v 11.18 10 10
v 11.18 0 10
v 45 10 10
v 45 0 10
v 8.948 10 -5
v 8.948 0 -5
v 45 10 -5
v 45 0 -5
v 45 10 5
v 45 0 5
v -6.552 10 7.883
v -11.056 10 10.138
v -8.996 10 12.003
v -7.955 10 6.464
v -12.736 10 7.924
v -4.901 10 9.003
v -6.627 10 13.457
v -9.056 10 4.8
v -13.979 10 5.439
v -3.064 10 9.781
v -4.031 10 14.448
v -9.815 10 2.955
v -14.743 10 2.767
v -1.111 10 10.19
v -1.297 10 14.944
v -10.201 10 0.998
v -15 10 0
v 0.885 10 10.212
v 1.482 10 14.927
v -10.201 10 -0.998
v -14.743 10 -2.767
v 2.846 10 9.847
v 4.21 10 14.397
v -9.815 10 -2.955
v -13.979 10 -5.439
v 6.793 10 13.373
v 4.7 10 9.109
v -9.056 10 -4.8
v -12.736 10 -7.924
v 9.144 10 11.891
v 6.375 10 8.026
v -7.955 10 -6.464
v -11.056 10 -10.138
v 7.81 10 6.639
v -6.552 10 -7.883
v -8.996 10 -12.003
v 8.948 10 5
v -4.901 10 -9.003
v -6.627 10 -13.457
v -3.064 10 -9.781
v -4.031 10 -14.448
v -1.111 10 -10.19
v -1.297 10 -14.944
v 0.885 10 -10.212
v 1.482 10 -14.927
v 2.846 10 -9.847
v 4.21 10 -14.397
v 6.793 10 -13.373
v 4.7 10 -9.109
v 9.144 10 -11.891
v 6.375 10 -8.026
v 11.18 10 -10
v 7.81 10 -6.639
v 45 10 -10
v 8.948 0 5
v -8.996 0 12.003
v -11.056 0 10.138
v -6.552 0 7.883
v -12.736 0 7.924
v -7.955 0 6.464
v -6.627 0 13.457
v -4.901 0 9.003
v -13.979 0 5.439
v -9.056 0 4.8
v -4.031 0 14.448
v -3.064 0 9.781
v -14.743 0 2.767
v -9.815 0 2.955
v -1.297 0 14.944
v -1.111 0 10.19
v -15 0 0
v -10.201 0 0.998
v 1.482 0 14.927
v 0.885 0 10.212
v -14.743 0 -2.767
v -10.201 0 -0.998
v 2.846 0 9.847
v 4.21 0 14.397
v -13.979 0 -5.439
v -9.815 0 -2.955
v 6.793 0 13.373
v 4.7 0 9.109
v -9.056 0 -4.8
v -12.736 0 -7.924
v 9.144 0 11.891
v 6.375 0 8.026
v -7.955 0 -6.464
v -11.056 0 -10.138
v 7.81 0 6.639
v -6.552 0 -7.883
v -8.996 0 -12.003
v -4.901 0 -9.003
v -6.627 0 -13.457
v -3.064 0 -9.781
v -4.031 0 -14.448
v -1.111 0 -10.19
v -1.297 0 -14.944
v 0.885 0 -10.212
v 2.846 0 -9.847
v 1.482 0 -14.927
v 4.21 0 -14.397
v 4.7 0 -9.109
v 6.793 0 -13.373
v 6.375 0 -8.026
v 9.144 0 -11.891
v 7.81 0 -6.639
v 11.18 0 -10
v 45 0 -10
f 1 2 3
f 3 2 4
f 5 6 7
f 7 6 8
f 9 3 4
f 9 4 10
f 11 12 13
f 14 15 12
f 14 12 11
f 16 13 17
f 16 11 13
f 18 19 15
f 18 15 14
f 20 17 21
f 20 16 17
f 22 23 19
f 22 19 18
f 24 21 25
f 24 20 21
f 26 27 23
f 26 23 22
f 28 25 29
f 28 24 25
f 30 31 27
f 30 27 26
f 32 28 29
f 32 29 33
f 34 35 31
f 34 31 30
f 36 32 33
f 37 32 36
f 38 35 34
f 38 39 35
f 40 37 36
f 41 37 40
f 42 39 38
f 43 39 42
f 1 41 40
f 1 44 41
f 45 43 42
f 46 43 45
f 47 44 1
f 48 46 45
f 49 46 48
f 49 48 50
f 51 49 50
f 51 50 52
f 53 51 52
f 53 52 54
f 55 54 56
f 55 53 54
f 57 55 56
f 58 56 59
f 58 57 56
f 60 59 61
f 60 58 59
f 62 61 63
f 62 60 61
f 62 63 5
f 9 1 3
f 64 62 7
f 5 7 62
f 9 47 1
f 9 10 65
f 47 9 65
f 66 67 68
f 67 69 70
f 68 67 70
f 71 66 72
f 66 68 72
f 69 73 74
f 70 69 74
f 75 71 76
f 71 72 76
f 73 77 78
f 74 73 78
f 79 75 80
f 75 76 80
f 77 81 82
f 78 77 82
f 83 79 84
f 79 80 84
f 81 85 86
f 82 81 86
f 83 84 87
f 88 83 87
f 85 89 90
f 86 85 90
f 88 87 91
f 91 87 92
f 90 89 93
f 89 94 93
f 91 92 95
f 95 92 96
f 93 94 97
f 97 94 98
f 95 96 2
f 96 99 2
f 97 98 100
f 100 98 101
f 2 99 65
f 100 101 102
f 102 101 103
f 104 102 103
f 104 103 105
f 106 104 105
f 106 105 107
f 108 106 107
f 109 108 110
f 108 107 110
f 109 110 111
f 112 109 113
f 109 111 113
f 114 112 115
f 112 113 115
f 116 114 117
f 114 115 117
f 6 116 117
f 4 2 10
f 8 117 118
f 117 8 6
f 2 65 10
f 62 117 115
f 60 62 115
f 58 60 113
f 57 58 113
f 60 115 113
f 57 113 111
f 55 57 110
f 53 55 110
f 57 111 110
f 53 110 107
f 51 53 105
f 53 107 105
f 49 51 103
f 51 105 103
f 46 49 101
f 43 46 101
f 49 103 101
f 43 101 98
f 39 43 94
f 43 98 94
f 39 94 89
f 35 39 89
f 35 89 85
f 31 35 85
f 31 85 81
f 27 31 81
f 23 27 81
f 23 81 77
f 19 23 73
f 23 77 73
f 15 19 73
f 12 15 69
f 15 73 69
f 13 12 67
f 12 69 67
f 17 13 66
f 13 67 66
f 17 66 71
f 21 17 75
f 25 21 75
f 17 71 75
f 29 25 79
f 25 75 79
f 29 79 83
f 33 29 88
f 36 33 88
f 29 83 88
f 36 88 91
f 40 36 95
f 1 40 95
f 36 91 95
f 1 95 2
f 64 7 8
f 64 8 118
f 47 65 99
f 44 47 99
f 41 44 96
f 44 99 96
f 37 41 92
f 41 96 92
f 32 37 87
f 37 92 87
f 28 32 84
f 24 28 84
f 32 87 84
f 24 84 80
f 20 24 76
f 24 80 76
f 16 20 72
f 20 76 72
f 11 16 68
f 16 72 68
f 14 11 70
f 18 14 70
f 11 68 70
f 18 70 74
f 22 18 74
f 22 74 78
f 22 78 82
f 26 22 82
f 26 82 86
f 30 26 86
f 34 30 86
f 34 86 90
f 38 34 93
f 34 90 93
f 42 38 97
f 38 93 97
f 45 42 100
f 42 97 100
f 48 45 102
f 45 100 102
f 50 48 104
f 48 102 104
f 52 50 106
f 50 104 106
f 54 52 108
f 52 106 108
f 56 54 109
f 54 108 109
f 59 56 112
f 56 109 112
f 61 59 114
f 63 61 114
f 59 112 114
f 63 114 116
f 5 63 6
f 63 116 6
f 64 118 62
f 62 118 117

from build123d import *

# Parameters (mm, degrees)
EXTRUDE_1_DEPTH     = 10
SKETCH_2_W          = 5
SKETCH_2_H          = 10
CUT_EXTRUDE_1_DEPTH = 10


with BuildPart() as part:
    # 草图1 → 凸台-拉伸1 (new body)
    with BuildSketch(Plane(origin=(0, 0, 0), x_dir=(1, 0, 0), z_dir=(0, 1, 0))):
        with BuildLine():
            ThreePointArc((11.180339887, 10), (12.90569415, 7.644805982), (14.142135624, 5))
            Line((14.142135624, 5), (50, 5))
            Line((50, 5), (55, 5))
            Line((55, 5), (55, 10))
            Line((55, 10), (11.180339887, 10))
        make_face()
        with BuildLine():
            Line((8.947765084, 5), (14.142135624, 5))
            ThreePointArc((14.142135624, 5), (12.90569415, 7.644805982), (11.180339887, 10))
            ThreePointArc((11.180339887, 10), (-15, 0), (11.180339887, -10))
            ThreePointArc((11.180339887, -10), (12.90569415, -7.644805982), (14.142135624, -5))
            Line((14.142135624, -5), (8.947765084, -5))
            ThreePointArc((8.947765084, -5), (-10.25, 0), (8.947765084, 5))
        make_face()
        with BuildLine():
            Line((50, -5), (14.142135624, -5))
            ThreePointArc((14.142135624, -5), (12.90569415, -7.644805982), (11.180339887, -10))
            Line((11.180339887, -10), (55, -10))
            Line((55, -10), (55, -5))
            Line((55, -5), (50, -5))
        make_face()
    extrude(amount=EXTRUDE_1_DEPTH)

    # 草图2 → 切除-拉伸1 (cut)
    with BuildSketch(Plane(origin=(55, 0, 0), x_dir=(0, 0, -1), z_dir=(1, 0, 0))):
        with Locations((7.5, 5)):
            Rectangle(SKETCH_2_W, SKETCH_2_H)
        with Locations((-7.5, 5)):
            Rectangle(SKETCH_2_W, SKETCH_2_H)
    extrude(amount=-CUT_EXTRUDE_1_DEPTH, mode=Mode.SUBTRACT)


solid = part.part
